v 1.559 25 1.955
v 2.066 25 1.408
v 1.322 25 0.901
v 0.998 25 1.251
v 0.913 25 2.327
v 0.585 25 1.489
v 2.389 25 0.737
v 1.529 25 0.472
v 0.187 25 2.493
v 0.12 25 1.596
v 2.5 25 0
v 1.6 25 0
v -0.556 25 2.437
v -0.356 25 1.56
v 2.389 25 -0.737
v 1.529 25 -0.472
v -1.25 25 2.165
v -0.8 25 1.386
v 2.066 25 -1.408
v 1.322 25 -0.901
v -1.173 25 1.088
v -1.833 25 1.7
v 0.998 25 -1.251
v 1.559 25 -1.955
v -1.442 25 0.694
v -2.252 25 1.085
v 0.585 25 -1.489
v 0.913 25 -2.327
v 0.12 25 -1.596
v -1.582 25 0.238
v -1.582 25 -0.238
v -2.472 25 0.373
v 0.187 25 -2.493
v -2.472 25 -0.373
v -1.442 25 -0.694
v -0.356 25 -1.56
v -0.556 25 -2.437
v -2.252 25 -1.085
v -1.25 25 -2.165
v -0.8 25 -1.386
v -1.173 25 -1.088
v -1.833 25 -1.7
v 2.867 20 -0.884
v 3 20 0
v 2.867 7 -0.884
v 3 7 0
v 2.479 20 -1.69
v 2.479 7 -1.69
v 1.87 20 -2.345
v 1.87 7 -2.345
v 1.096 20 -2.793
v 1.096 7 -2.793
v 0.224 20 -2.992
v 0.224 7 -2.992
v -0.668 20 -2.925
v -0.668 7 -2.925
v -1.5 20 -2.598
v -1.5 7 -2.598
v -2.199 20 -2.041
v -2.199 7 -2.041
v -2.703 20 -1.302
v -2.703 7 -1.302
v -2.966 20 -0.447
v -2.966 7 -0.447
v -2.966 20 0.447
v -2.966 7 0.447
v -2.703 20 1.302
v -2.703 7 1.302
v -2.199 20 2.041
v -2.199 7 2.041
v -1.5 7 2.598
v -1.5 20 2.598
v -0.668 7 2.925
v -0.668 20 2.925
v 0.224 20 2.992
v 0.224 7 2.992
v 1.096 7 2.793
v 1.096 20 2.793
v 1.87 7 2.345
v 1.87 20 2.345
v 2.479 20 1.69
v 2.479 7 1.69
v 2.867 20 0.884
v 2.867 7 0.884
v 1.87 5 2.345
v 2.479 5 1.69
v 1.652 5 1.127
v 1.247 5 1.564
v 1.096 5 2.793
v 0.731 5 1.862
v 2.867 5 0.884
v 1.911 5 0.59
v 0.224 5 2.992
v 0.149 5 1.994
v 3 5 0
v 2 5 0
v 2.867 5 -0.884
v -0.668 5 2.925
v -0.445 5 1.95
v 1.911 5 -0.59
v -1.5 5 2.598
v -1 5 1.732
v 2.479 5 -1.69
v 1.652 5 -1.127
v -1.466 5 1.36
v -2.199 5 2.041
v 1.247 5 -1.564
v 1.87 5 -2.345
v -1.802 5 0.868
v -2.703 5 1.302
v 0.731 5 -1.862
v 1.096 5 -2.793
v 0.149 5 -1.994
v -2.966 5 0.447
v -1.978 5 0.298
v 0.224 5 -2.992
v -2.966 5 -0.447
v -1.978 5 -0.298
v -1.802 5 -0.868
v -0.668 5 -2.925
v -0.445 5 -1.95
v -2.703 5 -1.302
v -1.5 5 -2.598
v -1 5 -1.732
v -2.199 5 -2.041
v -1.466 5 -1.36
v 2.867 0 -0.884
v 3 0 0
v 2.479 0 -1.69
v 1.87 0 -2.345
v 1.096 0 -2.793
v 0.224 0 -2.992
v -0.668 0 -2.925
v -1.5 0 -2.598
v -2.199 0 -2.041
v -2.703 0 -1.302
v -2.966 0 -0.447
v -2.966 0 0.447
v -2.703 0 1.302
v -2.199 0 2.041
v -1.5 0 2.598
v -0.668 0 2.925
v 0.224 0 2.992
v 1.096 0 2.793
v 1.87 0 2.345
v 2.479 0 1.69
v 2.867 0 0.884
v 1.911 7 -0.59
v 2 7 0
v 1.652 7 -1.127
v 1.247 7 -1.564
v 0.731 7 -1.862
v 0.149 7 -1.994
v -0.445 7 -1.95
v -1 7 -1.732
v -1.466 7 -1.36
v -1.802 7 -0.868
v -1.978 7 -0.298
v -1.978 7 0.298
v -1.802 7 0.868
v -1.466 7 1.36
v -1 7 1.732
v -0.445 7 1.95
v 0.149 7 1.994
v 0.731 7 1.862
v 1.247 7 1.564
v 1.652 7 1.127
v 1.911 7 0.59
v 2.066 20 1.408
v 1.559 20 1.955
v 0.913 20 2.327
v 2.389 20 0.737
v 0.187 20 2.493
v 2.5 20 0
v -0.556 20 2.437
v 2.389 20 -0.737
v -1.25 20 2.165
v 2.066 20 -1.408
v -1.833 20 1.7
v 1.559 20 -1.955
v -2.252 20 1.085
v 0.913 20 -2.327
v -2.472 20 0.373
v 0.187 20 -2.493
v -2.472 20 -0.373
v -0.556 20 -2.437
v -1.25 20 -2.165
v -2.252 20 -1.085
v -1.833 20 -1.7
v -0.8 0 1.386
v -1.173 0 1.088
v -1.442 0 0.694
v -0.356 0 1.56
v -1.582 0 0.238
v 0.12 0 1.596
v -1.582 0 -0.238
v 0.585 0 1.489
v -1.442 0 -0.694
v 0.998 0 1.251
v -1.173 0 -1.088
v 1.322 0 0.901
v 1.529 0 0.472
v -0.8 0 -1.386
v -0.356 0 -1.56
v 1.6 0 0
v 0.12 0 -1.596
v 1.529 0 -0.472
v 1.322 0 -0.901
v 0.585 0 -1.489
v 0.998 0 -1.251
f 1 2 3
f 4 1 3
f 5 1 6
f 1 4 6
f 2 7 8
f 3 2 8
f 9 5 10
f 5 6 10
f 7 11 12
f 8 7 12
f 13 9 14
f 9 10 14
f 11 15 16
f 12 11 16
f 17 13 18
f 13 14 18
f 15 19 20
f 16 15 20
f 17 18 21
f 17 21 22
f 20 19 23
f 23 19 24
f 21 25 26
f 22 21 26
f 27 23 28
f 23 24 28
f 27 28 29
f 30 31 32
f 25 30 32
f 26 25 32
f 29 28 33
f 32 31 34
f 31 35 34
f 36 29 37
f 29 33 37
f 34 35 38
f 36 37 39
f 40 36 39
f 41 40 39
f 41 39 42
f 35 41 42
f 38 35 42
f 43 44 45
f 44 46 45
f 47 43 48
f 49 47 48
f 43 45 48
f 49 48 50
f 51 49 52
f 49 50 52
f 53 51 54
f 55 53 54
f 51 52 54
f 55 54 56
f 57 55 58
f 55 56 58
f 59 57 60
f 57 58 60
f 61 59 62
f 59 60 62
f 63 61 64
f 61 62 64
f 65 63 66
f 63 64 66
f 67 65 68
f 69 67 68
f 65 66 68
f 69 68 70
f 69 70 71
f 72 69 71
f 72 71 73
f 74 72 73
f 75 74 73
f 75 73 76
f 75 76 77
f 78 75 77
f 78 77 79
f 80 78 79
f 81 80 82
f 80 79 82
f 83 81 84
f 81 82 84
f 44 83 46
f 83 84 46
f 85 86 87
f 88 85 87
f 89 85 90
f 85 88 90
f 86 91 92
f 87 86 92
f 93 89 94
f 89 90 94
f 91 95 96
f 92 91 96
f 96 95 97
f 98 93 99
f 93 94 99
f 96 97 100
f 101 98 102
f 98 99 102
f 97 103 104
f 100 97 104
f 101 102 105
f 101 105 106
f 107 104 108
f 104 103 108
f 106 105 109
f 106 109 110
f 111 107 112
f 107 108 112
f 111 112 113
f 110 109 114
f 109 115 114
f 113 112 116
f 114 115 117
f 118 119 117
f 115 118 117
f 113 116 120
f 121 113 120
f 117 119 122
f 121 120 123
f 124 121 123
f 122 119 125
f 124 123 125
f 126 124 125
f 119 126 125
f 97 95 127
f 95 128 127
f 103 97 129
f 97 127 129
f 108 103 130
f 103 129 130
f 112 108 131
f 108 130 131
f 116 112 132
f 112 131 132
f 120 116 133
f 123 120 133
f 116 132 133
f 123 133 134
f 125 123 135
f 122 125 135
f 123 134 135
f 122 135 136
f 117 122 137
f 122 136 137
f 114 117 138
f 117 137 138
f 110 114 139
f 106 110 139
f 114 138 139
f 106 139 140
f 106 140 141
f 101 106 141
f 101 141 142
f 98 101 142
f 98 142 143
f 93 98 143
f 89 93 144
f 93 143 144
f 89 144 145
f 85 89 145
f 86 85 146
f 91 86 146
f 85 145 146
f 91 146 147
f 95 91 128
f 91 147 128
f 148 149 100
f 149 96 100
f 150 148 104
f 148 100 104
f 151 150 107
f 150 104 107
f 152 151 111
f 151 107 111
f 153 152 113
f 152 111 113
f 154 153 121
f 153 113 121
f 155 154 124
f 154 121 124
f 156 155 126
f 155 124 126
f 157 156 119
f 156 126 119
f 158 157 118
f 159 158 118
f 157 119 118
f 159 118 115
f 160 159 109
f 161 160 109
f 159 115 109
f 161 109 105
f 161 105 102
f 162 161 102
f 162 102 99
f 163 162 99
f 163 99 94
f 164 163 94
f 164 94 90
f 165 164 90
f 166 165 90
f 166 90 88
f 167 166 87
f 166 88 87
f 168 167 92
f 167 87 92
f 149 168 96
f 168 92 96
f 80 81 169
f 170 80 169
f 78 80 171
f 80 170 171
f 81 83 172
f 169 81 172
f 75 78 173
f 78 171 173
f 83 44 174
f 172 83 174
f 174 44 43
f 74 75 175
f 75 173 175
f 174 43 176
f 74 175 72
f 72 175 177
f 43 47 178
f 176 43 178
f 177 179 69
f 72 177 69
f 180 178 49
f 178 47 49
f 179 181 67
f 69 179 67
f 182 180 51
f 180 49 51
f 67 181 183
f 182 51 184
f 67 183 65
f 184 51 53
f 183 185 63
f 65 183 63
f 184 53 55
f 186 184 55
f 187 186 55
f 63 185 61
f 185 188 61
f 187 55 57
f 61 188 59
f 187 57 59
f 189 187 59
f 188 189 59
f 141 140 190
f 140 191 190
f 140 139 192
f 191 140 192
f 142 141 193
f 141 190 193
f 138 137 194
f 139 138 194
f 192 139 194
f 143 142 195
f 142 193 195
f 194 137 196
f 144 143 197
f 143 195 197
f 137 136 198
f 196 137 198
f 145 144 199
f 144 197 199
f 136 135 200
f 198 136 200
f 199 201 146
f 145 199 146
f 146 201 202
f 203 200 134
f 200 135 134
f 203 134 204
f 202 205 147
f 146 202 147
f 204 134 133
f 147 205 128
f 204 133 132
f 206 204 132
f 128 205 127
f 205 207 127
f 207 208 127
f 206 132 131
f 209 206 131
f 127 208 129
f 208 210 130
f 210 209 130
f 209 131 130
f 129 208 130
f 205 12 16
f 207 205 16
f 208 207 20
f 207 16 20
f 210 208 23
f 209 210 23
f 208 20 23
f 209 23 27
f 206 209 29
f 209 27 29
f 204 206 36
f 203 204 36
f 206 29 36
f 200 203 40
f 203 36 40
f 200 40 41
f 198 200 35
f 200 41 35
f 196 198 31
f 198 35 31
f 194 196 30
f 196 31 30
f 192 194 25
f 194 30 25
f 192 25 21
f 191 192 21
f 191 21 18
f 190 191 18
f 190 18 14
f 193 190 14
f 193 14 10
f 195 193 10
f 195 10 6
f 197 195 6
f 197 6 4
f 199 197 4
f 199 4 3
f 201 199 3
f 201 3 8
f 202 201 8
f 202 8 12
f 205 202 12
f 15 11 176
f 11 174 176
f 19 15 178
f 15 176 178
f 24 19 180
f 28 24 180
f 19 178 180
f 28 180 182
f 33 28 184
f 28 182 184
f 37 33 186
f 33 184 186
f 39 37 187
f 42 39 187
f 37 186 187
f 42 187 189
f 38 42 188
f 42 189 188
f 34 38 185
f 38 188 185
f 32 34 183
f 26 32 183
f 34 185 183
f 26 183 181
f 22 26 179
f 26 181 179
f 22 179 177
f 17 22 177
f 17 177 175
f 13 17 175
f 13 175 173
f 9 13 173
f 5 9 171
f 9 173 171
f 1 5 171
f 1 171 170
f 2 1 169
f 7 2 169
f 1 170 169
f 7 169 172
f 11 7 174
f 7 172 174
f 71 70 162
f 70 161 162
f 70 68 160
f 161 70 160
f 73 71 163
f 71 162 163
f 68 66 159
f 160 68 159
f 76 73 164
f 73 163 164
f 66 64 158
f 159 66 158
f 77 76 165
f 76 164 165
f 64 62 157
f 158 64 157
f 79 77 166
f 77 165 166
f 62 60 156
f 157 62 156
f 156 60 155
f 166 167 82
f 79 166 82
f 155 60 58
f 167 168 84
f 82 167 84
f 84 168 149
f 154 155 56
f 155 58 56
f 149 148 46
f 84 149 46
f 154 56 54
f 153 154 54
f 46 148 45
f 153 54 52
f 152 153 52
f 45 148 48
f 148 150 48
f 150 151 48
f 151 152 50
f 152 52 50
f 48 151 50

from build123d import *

# Parameters (mm, degrees)
SKETCH2_R          = 1.6
CUT_EXTRUDE1_DEPTH = 26


with BuildPart() as part:
    # Sketch1 → Revolve1 (revolve)
    with BuildSketch(Plane.XY):
        Polygon((0, 0), (0, 25), (2.5, 25), (2.5, 20), (3, 20), (3, 7), (2, 7), (2, 5), (3, 5), (3, 0), align=None)
    revolve(axis=Axis((0, 0, 0), (0, 1, 0)))

    # Sketch2 → Cut-Extrude1 (cut, through all)
    with BuildSketch(Plane(origin=(0, 25, 0), x_dir=(1, 0, 0), z_dir=(0, 1, 0))):
        Circle(SKETCH2_R)
    extrude(amount=-CUT_EXTRUDE1_DEPTH, mode=Mode.SUBTRACT)


solid = part.part
